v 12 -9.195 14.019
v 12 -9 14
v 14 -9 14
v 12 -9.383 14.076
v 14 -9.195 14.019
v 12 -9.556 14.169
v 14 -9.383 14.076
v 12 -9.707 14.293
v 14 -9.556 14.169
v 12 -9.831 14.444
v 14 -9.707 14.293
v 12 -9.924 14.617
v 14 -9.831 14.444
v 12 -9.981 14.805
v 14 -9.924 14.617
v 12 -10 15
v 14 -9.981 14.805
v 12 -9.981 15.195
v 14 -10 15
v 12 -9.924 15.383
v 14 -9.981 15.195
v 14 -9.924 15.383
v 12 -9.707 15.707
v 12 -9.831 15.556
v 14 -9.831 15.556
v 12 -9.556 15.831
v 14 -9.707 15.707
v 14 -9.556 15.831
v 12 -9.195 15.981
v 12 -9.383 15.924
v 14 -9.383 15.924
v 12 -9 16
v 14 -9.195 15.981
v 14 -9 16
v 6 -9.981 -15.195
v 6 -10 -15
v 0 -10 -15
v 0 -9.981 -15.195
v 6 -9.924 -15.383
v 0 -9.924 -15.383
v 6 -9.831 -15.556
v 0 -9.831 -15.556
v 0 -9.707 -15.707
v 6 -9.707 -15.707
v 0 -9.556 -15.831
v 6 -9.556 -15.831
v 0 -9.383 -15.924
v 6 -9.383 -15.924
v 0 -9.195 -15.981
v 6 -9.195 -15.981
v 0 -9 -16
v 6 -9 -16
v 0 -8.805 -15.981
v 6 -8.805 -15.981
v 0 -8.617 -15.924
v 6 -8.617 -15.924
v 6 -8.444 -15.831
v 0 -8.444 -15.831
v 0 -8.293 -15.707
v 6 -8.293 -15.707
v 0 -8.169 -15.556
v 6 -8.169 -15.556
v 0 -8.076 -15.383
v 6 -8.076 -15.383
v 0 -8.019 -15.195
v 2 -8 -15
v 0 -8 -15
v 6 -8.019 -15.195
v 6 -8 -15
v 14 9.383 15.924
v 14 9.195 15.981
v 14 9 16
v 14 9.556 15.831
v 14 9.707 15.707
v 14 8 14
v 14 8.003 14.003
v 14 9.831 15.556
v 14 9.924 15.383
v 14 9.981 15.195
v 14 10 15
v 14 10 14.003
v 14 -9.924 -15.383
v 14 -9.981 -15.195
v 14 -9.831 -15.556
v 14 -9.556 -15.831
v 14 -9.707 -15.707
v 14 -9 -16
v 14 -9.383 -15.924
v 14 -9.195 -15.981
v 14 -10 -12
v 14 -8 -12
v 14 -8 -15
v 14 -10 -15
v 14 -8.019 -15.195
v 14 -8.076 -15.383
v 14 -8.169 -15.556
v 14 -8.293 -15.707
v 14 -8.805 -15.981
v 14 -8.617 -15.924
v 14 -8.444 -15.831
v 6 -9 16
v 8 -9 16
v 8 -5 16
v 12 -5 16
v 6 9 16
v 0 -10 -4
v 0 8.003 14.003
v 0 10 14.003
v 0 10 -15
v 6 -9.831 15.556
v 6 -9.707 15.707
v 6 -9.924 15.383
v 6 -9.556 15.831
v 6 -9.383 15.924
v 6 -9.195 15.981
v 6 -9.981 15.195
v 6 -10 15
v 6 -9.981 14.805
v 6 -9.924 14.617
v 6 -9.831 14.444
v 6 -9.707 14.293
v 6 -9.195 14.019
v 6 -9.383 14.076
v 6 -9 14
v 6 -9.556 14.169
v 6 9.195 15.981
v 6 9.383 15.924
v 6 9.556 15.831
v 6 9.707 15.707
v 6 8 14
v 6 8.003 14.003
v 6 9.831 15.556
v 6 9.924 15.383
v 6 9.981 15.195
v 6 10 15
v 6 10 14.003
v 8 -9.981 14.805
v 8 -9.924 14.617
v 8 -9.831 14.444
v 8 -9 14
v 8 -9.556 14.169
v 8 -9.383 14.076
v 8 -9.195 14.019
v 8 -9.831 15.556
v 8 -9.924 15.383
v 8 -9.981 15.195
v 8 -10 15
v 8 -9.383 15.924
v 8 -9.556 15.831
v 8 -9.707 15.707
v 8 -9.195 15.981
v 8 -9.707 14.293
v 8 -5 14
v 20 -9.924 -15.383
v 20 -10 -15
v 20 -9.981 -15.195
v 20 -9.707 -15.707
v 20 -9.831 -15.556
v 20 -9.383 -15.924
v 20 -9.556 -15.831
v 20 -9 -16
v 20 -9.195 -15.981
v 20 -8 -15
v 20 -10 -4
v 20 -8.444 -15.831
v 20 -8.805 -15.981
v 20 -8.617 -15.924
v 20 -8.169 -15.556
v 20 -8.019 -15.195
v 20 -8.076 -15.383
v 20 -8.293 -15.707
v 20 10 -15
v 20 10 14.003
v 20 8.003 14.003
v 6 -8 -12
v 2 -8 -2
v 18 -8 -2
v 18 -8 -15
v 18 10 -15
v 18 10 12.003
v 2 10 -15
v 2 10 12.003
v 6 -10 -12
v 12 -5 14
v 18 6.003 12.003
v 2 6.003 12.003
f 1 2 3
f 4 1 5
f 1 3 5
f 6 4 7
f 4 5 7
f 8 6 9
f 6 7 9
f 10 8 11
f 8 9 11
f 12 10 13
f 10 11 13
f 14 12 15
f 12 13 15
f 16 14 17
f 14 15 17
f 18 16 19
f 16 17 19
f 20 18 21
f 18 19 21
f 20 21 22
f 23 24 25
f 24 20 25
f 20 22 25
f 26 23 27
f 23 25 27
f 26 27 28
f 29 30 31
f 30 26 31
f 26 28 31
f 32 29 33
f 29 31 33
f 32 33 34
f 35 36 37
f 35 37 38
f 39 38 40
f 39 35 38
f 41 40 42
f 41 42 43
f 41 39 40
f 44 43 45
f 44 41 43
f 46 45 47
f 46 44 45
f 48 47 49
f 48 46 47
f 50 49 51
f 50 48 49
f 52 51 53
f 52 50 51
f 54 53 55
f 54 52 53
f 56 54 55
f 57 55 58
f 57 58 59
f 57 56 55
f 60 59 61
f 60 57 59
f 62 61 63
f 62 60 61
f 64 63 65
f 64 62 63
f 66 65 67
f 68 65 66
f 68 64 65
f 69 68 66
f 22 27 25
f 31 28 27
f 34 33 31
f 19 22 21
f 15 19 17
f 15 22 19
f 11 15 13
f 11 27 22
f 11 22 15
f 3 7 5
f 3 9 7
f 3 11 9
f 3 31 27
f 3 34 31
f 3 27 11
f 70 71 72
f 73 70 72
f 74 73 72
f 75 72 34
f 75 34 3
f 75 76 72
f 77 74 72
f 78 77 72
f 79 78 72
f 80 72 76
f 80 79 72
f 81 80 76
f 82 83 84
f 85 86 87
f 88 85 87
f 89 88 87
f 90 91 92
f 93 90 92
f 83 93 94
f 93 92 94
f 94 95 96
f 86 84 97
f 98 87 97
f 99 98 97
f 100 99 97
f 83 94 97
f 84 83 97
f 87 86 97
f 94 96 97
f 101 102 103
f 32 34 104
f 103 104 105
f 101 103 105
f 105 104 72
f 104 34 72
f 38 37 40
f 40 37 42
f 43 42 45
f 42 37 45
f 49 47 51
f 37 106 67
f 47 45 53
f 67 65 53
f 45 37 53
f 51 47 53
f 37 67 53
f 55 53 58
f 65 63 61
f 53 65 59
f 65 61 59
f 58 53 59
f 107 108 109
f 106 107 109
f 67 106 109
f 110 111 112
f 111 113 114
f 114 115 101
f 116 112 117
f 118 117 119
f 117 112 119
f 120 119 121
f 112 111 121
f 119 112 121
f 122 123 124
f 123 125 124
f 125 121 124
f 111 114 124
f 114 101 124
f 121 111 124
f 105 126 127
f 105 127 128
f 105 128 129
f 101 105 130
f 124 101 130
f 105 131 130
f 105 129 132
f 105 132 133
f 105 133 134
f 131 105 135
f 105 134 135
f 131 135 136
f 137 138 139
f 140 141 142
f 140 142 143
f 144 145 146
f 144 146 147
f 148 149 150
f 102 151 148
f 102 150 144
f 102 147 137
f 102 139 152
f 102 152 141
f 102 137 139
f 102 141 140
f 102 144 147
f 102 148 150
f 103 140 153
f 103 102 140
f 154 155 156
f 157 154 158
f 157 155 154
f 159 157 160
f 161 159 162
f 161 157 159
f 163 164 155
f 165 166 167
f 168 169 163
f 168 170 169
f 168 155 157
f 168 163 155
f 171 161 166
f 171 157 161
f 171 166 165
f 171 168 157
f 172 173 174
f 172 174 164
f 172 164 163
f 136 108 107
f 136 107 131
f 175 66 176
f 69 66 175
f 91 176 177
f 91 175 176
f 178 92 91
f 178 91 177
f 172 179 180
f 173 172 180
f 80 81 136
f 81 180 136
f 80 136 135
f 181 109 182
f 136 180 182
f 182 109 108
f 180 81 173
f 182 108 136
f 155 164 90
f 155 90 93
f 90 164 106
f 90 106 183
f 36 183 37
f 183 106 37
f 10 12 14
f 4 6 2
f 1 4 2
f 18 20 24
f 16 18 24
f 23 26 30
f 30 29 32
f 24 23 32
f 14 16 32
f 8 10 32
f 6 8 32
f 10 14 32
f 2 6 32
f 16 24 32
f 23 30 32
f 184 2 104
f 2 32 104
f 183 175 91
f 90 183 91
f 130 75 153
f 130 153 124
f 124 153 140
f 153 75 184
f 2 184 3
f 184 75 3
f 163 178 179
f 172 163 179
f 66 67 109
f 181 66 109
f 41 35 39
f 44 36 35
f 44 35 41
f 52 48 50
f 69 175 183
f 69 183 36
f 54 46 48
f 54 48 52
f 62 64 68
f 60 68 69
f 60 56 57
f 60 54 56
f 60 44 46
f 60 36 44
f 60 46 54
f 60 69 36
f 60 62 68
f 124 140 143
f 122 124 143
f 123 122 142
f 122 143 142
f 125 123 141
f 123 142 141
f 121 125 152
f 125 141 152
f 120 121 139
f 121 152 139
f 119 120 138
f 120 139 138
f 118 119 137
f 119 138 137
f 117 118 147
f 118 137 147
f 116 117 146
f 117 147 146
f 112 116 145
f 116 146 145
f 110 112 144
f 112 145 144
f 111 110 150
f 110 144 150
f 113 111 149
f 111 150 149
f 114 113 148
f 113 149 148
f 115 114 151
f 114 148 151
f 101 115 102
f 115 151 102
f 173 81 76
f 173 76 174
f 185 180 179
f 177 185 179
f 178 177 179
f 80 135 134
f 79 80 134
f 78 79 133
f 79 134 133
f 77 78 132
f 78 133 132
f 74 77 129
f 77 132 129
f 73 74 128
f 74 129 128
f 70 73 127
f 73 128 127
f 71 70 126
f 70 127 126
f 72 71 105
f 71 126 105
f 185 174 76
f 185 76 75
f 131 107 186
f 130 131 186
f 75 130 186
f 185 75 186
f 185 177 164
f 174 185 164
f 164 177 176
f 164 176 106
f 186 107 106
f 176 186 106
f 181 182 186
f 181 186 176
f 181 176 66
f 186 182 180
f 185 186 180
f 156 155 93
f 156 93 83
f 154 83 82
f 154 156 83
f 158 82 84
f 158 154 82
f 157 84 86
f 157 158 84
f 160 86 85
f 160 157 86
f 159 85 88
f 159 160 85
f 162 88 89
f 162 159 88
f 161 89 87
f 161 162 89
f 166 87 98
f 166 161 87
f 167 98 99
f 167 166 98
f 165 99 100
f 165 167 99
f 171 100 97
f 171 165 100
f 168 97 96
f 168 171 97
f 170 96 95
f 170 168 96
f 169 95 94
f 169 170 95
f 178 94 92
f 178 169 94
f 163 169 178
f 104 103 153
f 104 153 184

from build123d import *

# Parameters (mm, degrees)
EXTRUDE_3_DEPTH     = 20
SKETCH_4_W          = 6
SKETCH_4_H          = 1.997420006
CUT_EXTRUDE_1_DEPTH = 20
EXTRUDE_4_DEPTH     = 8
SKETCH_6_R          = 1
EXTRUDE_5_DEPTH     = 20
SKETCH_7_W          = 16
SKETCH_7_H          = 28.677583324
CUT_EXTRUDE_3_DEPTH = 18
SKETCH_8_W          = 4
SKETCH_8_H          = 6.365219316
CUT_EXTRUDE_4_DEPTH = 10
SKETCH_9_W          = 8
SKETCH_9_H          = 4
CUT_EXTRUDE_5_DEPTH = 10


with BuildPart() as part:
    # 草图3 → 凸台-拉伸3 (new body)
    with BuildSketch(Plane(origin=(0, 0, 0), x_dir=(0, 0, -1), z_dir=(1, 0, 0))):
        with BuildLine():
            Line((-14.292893219, 8.292893219), (4, -10))
            Line((4, -10), (15, -10))
            Line((15, -10), (15, 10))
            Line((15, 10), (-15, 10))
            ThreePointArc((-15, 10), (-15.923879533, 8.617316568), (-14.292893219, 8.292893219))
        make_face()
    extrude(amount=EXTRUDE_3_DEPTH)

    # 草图4 → 切除-拉伸1 (cut)
    with BuildSketch(Plane(origin=(0, 10, 0), x_dir=(1, 0, 0), z_dir=(0, 1, 0))):
        with Locations((3, -15.001289997)):
            Rectangle(SKETCH_4_W, SKETCH_4_H)
        with Locations((17, -15.001289997)):
            Rectangle(SKETCH_4_W, SKETCH_4_H)
    extrude(amount=-CUT_EXTRUDE_1_DEPTH, mode=Mode.SUBTRACT)

    # 草图5 → 凸台-拉伸4 (add)
    with BuildSketch(Plane(origin=(14, 0, 0), x_dir=(0, 0, -1), z_dir=(1, 0, 0))):
        with BuildLine():
            Line((-14, 9), (-14, -9))
            ThreePointArc((-14, -9), (-15, -10), (-16, -9))
            Line((-16, -9), (-16, 9))
            ThreePointArc((-16, 9), (-15, 10), (-14, 9))
        make_face()
    extrude(amount=-EXTRUDE_4_DEPTH)

    # 草图6 → 凸台-拉伸5 (add)
    with BuildSketch(Plane(origin=(20, 0, 0), x_dir=(0, 0, -1), z_dir=(1, 0, 0))):
        with Locations((15, -9)):
            Circle(SKETCH_6_R)
    extrude(amount=-EXTRUDE_5_DEPTH)

    # 草图7 → 切除-拉伸3 (cut)
    with BuildSketch(Plane(origin=(0, 10, 0), x_dir=(1, 0, 0), z_dir=(0, 1, 0))):
        with Locations((10, 2.336211668)):
            Rectangle(SKETCH_7_W, SKETCH_7_H)
    extrude(amount=-CUT_EXTRUDE_3_DEPTH, mode=Mode.SUBTRACT)

    # 草图8 → 切除-拉伸4 (cut)
    with BuildSketch(Plane.XY.offset(16)):
        with Locations((10, -8.182609658)):
            Rectangle(SKETCH_8_W, SKETCH_8_H)
    extrude(amount=-CUT_EXTRUDE_4_DEPTH, mode=Mode.SUBTRACT)

    # 草图9 → 切除-拉伸5 (cut)
    with BuildSketch(Plane(origin=(0, -8, 0), x_dir=(1, 0, 0), z_dir=(0, 1, 0))):
        with Locations((10, 14)):
            Rectangle(SKETCH_9_W, SKETCH_9_H)
    extrude(amount=-CUT_EXTRUDE_5_DEPTH, mode=Mode.SUBTRACT)


solid = part.part
